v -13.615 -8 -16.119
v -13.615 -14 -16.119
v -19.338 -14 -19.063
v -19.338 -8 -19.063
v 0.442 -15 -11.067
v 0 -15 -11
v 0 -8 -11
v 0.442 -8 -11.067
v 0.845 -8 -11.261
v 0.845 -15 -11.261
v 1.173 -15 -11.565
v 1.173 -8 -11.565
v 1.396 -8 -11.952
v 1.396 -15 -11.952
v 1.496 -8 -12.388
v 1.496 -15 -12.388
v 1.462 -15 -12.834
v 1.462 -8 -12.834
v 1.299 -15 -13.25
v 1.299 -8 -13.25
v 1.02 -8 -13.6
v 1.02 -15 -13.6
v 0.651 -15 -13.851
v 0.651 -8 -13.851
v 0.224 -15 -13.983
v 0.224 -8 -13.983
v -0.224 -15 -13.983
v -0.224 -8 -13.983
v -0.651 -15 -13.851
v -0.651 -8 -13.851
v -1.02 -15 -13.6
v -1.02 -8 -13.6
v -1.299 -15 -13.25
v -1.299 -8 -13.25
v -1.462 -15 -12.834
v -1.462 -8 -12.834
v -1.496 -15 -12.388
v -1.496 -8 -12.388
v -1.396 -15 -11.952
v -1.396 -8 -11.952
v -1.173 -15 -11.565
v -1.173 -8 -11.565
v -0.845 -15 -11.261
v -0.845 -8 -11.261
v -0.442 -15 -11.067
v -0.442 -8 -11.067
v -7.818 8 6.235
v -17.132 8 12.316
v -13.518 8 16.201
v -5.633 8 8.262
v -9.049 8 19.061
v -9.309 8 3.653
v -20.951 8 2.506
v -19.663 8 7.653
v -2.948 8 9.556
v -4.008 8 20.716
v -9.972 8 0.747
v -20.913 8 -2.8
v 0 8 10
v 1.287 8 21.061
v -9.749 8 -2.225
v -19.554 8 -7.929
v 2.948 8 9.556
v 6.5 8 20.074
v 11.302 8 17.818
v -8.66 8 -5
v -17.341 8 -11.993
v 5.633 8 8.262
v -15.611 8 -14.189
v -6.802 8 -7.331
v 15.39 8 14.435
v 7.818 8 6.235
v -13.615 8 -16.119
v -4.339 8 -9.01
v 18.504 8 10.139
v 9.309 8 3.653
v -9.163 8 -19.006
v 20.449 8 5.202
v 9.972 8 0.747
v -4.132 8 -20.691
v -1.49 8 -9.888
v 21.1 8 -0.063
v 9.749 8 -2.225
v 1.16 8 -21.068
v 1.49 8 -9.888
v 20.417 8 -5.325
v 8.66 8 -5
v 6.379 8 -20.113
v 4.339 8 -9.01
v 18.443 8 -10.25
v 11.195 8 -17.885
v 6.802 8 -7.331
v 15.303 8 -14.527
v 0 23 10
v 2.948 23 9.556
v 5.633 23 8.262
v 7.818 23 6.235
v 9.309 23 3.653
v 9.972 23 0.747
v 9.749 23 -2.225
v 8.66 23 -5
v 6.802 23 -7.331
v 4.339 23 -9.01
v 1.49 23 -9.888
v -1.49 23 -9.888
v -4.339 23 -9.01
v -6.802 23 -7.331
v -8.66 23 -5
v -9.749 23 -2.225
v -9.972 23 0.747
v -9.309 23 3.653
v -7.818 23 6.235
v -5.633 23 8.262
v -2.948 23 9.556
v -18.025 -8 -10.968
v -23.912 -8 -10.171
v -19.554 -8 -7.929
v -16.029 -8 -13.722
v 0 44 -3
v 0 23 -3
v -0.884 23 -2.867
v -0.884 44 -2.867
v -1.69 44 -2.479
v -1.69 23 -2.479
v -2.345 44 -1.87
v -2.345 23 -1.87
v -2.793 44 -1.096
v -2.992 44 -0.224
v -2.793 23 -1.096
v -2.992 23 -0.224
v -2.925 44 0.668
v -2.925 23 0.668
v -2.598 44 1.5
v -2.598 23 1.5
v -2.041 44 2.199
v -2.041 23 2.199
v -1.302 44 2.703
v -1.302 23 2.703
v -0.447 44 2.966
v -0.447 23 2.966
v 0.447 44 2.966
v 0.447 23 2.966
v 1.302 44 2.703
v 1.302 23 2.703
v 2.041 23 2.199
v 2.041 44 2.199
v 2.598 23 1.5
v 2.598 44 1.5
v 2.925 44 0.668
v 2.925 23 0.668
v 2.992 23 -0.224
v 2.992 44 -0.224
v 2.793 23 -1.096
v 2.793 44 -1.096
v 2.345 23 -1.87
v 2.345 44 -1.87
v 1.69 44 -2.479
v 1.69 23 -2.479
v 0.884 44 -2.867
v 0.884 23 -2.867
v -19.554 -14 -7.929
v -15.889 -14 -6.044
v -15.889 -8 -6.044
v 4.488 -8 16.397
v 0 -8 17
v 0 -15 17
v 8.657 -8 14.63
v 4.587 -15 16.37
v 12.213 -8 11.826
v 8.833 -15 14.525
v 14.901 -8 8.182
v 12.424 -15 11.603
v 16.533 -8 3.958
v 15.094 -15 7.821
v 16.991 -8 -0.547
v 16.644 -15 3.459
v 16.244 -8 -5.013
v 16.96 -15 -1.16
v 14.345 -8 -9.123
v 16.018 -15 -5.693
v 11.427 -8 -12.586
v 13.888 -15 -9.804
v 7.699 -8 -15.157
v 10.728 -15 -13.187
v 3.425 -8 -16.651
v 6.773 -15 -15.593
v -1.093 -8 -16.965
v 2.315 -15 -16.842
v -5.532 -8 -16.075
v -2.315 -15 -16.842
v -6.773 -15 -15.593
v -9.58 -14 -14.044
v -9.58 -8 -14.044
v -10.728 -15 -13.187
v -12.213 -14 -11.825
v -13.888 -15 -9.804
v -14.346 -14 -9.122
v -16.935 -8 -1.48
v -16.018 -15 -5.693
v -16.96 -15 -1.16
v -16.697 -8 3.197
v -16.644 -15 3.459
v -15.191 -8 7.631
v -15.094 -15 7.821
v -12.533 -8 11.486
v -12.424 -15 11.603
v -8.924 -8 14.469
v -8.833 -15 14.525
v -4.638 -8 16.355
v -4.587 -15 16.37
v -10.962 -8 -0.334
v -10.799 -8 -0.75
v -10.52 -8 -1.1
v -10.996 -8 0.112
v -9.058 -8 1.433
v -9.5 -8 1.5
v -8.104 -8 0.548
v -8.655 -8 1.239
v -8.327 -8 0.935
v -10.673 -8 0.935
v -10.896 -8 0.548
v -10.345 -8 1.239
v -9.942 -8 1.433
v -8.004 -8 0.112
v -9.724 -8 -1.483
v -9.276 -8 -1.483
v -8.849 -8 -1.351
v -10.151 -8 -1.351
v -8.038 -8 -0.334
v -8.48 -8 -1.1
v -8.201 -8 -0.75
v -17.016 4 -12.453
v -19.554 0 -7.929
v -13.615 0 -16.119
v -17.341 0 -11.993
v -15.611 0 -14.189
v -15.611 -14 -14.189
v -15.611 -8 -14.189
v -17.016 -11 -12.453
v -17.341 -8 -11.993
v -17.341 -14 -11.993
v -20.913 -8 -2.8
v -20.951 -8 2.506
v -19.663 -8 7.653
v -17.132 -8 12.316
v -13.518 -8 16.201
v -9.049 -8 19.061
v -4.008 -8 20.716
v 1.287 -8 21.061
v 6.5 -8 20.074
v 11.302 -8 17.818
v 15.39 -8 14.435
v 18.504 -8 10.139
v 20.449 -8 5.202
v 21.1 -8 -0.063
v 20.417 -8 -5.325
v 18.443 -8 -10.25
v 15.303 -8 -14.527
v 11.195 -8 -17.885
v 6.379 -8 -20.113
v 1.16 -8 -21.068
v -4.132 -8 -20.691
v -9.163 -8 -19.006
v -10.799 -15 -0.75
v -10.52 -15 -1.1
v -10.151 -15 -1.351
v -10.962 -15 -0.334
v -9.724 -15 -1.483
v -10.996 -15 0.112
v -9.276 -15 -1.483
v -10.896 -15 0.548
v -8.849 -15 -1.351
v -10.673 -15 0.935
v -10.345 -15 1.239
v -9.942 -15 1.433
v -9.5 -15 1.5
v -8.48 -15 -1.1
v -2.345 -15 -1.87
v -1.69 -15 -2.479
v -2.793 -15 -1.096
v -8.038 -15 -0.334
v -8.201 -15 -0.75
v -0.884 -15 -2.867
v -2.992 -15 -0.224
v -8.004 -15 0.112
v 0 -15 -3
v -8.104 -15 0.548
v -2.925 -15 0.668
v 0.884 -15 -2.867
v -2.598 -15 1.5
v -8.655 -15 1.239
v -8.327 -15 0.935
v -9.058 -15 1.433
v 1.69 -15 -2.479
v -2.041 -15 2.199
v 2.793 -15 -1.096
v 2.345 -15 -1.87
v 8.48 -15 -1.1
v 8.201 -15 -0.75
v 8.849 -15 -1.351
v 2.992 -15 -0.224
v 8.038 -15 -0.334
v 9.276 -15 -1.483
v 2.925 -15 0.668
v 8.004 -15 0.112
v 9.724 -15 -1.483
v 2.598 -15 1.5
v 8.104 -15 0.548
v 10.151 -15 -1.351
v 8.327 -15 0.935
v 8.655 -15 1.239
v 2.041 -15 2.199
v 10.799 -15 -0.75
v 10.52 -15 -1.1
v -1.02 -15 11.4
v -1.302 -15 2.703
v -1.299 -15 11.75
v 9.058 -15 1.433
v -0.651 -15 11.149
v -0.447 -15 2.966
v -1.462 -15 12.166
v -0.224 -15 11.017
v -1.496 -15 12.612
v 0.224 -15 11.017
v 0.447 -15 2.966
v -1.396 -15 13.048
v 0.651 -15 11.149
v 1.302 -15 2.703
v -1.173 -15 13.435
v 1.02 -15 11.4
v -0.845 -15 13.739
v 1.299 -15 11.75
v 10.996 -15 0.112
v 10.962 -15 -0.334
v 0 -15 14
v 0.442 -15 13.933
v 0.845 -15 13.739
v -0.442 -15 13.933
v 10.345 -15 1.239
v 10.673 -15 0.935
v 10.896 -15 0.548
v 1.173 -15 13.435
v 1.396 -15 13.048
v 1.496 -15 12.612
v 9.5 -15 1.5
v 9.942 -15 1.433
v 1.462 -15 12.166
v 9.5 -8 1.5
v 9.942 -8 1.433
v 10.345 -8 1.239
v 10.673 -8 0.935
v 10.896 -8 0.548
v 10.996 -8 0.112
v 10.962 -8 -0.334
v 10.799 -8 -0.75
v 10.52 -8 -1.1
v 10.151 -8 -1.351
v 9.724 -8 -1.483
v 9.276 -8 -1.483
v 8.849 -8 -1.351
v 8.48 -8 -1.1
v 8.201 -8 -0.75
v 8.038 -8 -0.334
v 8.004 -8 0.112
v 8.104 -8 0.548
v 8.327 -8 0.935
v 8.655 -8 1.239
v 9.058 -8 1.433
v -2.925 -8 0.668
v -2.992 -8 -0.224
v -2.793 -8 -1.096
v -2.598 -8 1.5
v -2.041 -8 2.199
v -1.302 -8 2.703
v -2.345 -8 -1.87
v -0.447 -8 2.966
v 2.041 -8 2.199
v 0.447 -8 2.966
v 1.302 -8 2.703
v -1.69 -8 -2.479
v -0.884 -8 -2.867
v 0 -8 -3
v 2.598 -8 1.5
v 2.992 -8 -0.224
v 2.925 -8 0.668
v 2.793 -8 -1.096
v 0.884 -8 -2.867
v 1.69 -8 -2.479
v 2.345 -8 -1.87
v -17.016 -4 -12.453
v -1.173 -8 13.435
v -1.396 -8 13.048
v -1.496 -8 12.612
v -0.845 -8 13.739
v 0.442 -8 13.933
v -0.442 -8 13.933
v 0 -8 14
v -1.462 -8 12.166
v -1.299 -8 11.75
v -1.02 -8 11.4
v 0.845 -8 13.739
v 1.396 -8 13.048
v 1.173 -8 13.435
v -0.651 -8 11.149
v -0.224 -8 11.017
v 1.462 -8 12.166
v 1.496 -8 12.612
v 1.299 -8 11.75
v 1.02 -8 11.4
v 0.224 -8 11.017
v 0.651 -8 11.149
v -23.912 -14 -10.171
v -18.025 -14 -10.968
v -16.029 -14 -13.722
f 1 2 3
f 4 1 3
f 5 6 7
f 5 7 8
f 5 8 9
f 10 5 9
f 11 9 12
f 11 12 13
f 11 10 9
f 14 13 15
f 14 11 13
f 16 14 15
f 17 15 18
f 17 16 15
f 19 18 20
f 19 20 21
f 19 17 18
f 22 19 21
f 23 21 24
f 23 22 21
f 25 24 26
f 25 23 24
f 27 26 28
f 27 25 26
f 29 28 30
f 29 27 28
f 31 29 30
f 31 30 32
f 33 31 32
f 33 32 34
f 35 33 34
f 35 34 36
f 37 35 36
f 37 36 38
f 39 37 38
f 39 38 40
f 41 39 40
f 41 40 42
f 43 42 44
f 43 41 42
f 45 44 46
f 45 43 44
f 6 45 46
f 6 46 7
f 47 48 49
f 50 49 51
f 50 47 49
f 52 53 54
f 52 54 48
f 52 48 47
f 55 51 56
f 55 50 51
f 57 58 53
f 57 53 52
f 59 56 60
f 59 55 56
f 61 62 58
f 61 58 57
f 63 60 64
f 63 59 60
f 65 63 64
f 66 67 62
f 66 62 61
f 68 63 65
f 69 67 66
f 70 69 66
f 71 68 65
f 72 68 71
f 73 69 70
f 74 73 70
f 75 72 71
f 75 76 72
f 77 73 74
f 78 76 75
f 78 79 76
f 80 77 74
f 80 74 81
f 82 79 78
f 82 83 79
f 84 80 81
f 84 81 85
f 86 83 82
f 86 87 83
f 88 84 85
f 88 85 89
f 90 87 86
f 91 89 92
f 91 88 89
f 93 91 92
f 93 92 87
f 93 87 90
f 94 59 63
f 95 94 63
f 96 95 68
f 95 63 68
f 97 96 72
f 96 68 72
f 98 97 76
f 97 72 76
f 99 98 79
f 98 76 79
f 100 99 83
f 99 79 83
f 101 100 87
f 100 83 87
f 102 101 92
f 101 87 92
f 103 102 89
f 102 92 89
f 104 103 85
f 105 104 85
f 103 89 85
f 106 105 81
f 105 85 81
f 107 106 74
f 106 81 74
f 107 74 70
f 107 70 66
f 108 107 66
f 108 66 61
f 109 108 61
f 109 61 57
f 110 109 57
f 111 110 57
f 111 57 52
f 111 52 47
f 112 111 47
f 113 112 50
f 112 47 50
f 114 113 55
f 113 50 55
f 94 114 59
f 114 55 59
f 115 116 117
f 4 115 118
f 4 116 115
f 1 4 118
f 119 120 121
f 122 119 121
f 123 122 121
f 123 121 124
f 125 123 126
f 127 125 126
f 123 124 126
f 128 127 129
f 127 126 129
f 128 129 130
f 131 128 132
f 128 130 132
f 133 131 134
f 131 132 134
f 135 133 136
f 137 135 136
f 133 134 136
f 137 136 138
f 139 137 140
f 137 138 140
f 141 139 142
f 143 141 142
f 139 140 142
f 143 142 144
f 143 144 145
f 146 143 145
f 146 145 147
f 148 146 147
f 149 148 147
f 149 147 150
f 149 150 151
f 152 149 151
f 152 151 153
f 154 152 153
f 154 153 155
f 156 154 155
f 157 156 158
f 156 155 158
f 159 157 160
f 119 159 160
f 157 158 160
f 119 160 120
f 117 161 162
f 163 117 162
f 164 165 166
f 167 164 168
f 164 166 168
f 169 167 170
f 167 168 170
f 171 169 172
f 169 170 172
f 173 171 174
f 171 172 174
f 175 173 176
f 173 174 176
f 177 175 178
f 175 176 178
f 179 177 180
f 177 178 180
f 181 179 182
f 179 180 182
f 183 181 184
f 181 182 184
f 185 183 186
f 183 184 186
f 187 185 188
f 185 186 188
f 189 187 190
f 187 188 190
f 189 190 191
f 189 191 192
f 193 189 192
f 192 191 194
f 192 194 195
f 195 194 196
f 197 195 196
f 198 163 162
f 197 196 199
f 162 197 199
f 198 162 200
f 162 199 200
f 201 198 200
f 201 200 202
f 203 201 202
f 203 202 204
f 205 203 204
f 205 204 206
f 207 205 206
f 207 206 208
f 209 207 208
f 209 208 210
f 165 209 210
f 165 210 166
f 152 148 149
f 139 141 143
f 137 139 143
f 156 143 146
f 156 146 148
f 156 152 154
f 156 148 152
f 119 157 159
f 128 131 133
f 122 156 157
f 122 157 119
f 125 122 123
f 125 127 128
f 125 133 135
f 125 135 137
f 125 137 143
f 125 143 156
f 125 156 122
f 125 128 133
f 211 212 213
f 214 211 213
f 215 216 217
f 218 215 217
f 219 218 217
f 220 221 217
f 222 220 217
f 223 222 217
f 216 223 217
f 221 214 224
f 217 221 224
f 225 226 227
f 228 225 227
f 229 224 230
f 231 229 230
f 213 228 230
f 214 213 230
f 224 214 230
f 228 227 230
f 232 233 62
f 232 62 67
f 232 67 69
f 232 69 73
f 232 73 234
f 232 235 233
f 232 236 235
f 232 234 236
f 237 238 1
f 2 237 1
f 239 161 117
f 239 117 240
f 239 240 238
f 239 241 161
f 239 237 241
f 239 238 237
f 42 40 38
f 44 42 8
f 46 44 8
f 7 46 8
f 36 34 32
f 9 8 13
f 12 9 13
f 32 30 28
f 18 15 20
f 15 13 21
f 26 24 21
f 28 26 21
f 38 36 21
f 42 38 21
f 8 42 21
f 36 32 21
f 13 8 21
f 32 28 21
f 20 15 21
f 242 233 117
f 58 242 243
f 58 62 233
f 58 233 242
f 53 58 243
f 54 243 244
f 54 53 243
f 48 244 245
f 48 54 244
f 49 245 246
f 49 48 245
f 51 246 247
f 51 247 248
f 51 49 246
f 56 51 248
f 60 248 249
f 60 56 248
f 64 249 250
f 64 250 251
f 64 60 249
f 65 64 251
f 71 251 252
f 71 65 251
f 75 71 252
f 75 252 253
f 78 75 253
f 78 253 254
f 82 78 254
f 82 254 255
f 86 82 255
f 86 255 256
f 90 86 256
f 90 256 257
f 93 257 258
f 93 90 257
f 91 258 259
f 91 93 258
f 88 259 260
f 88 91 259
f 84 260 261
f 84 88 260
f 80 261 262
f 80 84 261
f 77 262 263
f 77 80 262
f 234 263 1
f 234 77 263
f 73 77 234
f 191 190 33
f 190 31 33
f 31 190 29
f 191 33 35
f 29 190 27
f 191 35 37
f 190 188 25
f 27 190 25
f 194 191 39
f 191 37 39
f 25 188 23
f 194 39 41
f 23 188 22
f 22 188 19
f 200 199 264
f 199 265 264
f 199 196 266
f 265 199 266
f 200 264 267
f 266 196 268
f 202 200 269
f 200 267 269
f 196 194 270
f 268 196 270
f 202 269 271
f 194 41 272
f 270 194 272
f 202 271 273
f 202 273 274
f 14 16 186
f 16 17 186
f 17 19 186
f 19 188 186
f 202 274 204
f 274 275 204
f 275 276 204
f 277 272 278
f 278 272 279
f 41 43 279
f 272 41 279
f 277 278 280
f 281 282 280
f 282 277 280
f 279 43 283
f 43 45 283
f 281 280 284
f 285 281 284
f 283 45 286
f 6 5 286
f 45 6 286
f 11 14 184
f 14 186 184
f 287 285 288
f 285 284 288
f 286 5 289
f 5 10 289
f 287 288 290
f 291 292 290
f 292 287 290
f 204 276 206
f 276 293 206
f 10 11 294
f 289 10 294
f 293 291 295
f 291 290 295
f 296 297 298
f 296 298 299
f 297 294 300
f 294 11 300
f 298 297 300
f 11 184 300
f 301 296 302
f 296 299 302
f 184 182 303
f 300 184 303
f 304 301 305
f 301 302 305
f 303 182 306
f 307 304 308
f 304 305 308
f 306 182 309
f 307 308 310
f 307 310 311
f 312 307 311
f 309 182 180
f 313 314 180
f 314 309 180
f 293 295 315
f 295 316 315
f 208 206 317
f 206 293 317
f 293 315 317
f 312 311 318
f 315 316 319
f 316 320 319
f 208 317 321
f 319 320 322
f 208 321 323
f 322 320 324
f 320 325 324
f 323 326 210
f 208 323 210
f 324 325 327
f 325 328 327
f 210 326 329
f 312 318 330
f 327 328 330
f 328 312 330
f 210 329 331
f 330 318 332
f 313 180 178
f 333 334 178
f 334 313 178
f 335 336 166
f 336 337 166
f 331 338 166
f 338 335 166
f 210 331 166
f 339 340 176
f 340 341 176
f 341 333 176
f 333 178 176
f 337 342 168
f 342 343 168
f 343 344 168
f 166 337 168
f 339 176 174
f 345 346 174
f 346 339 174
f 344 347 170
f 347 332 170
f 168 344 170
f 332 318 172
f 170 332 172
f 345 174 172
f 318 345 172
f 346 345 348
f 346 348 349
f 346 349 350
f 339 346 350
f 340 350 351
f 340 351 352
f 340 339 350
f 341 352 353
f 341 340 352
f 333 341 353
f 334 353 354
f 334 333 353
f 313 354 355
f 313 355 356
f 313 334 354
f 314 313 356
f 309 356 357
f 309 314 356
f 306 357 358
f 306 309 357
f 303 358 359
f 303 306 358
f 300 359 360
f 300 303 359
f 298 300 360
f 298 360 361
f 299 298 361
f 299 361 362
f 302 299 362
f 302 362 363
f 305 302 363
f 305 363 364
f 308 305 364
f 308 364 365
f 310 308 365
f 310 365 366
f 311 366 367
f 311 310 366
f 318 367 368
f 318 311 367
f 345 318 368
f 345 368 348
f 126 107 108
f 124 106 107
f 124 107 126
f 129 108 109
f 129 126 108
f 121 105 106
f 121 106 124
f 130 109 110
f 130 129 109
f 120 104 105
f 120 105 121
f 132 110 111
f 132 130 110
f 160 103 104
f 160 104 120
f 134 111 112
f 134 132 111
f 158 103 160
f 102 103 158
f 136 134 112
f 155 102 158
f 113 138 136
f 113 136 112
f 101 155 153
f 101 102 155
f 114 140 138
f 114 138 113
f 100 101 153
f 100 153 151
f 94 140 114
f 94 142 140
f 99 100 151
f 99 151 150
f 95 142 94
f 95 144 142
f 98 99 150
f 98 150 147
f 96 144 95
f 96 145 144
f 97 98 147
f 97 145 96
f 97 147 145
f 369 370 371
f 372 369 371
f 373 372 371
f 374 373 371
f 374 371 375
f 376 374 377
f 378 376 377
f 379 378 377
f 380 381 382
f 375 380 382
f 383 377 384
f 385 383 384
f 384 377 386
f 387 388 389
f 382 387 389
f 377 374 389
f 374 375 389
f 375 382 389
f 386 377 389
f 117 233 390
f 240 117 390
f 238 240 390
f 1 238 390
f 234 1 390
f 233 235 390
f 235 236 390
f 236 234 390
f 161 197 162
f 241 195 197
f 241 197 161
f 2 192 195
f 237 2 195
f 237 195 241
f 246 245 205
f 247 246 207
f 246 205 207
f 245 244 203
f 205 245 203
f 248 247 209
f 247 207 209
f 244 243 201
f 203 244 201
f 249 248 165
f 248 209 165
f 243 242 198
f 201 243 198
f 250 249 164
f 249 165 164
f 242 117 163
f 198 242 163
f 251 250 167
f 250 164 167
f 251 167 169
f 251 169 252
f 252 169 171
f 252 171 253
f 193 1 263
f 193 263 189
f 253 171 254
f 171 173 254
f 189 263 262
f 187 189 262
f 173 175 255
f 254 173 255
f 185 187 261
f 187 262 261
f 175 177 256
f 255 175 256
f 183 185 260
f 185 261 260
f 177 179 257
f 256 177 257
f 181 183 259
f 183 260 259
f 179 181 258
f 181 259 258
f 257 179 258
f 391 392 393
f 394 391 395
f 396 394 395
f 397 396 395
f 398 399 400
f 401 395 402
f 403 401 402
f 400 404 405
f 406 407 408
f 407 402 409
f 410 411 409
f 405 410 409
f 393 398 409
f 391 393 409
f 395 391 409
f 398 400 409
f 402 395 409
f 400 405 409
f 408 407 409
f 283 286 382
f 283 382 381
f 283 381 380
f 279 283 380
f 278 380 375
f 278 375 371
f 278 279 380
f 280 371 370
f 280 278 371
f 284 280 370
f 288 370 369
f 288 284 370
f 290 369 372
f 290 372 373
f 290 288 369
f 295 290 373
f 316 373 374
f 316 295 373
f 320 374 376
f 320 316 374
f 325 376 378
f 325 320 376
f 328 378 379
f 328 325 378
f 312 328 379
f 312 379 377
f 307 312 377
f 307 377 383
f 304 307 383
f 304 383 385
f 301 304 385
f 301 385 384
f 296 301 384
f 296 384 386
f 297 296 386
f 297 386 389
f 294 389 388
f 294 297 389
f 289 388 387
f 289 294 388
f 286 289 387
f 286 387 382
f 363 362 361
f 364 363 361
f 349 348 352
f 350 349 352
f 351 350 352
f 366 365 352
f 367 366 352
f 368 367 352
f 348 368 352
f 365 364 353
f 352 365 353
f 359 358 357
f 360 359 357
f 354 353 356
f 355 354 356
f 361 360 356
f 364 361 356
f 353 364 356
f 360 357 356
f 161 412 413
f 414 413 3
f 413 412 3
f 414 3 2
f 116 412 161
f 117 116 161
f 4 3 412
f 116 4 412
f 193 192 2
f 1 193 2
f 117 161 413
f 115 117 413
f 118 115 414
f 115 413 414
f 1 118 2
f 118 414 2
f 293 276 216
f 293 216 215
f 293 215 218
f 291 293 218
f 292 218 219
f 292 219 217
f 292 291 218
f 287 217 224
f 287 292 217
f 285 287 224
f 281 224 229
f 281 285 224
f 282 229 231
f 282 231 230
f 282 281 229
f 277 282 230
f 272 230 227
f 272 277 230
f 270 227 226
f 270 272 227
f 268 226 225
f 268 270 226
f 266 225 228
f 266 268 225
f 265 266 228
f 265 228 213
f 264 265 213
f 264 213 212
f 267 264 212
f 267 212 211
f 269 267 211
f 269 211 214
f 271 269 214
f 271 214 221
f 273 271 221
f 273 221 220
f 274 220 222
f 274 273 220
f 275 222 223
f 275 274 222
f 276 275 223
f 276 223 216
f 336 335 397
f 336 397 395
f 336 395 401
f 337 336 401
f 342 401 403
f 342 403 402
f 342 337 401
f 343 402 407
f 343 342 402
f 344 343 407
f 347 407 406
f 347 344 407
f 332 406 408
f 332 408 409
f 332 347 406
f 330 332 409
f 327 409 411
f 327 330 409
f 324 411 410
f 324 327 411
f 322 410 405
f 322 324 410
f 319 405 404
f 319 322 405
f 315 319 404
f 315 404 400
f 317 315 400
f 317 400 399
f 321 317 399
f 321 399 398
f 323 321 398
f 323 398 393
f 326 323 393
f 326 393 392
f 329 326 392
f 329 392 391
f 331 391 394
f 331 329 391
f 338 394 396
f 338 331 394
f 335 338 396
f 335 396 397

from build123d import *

# Parameters (mm, degrees)
BOSS_EXTRUDE1_DEPTH   = 8
BOSS_EXTRUDE2_START   = 8
SKETCH2_3_R           = 10
BOSS_EXTRUDE2_DEPTH   = 15
BOSS_EXTRUDE3_START   = 23
SKETCH2_4_R           = 3
BOSS_EXTRUDE3_DEPTH   = 21
BOSS_EXTRUDE4_START   = -15
SKETCH2_5_R           = 17
SKETCH2_5_R_2         = 1.5
SKETCH2_5_R_3         = 3
BOSS_EXTRUDE4_DEPTH   = 7
BOSS_EXTRUDE5_START   = -14
BOSS_EXTRUDE5_DEPTH   = 6
BOSS_EXTRUDE5_2_DEPTH = 6


# Read off the part's stored shape, not the designer's step: Boss-Extrude5
with BuildPart() as part:
    # Sketch2 → Boss-Extrude1 (new, symmetric)
    with BuildSketch(Plane(origin=(0, 0, 0), x_dir=(1, 0, 0), z_dir=(0, 1, 0))):
        with BuildLine():
            ThreePointArc((-19.553646138, 7.928740297), (17.082571878, -12.385303308), (-13.615145539, 16.119485474))
            add(Edge.make_bspline(
                [(-19.553646138, 7.928740297), (-17.447949133, 12.882150211), (-13.615145539, 16.119485474)],
                knots=[0, 0, 0, 0.780076173, 0.780076173, 0.780076173], degree=2))
        make_face()
    extrude(amount=BOSS_EXTRUDE1_DEPTH, both=True)

    # Sketch2<3> → Boss-Extrude2 (add)
    with BuildSketch(Plane(origin=(0, 0, 0), x_dir=(1, 0, 0), z_dir=(0, 1, 0)).offset(BOSS_EXTRUDE2_START)):
        with Locations(Location((0, 0, 0), (0, 0, 270))):
            Circle(SKETCH2_3_R)
    extrude(amount=BOSS_EXTRUDE2_DEPTH)

    # Sketch2<4> → Boss-Extrude3 (add)
    with BuildSketch(Plane(origin=(0, 0, 0), x_dir=(1, 0, 0), z_dir=(0, 1, 0)).offset(BOSS_EXTRUDE3_START)):
        with Locations(Location((0, 0, 0), (0, 0, 90))):
            Circle(SKETCH2_4_R)
    extrude(amount=BOSS_EXTRUDE3_DEPTH)

    # Sketch2<5> → Boss-Extrude4 (add)
    with BuildSketch(Plane(origin=(0, 0, 0), x_dir=(1, 0, 0), z_dir=(0, 1, 0)).offset(BOSS_EXTRUDE4_START)):
        with Locations(Location((0, 0, 0), (0, 0, 270))):
            Circle(SKETCH2_5_R)
        with Locations(Location((0, 12.5, 0), (0, 0, 270))):
            Circle(SKETCH2_5_R_2, mode=Mode.SUBTRACT)
        with Locations(Location((-9.5, 0, 0), (0, 0, 270))):
            Circle(SKETCH2_5_R_2, mode=Mode.SUBTRACT)
        with Locations(Location((9.5, 0, 0), (0, 0, 270))):
            Circle(SKETCH2_5_R_2, mode=Mode.SUBTRACT)
        with Locations(Location((0, -12.5, 0), (0, 0, 270))):
            Circle(SKETCH2_5_R_2, mode=Mode.SUBTRACT)
        with Locations(Location((0, 0, 0), (0, 0, 90))):
            Circle(SKETCH2_5_R_3, mode=Mode.SUBTRACT)
    extrude(amount=BOSS_EXTRUDE4_DEPTH)

    # Boss-Extrude5 2 outline → Boss-Extrude5 2 (add)
    with BuildSketch(Plane(origin=(0, 0, 0), x_dir=(1, 0, 0), z_dir=(0, 1, 0)).offset(BOSS_EXTRUDE5_START)):
        with BuildLine():
            add(Edge.make_bspline(
                [(-19.553646138, 7.928740297), (-17.447949162, 12.882150142), (-13.615145647, 16.119485383)],
                knots=[0, 0, 0, 1, 1, 1], degree=2))
            Line((-19.553646138, 7.928740297), (-15.889340318, 6.043911337))
            ThreePointArc((-15.889340318, 6.043911337), (-13.34797436, 10.527657883), (-9.579771413, 14.043787939))
            Line((-9.579771413, 14.043787939), (-13.615145647, 16.119485383))
        make_face()
    extrude(amount=BOSS_EXTRUDE5_2_DEPTH)


with BuildPart() as body_2:
    # Boss-Extrude5 outline → Boss-Extrude5 (new body)
    with BuildSketch(Plane(origin=(0, 0, 0), x_dir=(1, 0, 0), z_dir=(0, 1, 0)).offset(BOSS_EXTRUDE5_START)):
        with BuildLine():
            Line((-19.337935144, 19.063147812), (-23.912046336, 10.170594366))
            Line((-23.912046336, 10.170594366), (-19.553646138, 7.928740297))
            ThreePointArc((-19.553646138, 7.928740297), (-17.08257192, 12.385303251), (-13.615145647, 16.119485383))
            Line((-13.615145647, 16.119485383), (-19.337935144, 19.063147812))
        make_face()
    extrude(amount=BOSS_EXTRUDE5_DEPTH)


solid = Compound([part.part, body_2.part])
